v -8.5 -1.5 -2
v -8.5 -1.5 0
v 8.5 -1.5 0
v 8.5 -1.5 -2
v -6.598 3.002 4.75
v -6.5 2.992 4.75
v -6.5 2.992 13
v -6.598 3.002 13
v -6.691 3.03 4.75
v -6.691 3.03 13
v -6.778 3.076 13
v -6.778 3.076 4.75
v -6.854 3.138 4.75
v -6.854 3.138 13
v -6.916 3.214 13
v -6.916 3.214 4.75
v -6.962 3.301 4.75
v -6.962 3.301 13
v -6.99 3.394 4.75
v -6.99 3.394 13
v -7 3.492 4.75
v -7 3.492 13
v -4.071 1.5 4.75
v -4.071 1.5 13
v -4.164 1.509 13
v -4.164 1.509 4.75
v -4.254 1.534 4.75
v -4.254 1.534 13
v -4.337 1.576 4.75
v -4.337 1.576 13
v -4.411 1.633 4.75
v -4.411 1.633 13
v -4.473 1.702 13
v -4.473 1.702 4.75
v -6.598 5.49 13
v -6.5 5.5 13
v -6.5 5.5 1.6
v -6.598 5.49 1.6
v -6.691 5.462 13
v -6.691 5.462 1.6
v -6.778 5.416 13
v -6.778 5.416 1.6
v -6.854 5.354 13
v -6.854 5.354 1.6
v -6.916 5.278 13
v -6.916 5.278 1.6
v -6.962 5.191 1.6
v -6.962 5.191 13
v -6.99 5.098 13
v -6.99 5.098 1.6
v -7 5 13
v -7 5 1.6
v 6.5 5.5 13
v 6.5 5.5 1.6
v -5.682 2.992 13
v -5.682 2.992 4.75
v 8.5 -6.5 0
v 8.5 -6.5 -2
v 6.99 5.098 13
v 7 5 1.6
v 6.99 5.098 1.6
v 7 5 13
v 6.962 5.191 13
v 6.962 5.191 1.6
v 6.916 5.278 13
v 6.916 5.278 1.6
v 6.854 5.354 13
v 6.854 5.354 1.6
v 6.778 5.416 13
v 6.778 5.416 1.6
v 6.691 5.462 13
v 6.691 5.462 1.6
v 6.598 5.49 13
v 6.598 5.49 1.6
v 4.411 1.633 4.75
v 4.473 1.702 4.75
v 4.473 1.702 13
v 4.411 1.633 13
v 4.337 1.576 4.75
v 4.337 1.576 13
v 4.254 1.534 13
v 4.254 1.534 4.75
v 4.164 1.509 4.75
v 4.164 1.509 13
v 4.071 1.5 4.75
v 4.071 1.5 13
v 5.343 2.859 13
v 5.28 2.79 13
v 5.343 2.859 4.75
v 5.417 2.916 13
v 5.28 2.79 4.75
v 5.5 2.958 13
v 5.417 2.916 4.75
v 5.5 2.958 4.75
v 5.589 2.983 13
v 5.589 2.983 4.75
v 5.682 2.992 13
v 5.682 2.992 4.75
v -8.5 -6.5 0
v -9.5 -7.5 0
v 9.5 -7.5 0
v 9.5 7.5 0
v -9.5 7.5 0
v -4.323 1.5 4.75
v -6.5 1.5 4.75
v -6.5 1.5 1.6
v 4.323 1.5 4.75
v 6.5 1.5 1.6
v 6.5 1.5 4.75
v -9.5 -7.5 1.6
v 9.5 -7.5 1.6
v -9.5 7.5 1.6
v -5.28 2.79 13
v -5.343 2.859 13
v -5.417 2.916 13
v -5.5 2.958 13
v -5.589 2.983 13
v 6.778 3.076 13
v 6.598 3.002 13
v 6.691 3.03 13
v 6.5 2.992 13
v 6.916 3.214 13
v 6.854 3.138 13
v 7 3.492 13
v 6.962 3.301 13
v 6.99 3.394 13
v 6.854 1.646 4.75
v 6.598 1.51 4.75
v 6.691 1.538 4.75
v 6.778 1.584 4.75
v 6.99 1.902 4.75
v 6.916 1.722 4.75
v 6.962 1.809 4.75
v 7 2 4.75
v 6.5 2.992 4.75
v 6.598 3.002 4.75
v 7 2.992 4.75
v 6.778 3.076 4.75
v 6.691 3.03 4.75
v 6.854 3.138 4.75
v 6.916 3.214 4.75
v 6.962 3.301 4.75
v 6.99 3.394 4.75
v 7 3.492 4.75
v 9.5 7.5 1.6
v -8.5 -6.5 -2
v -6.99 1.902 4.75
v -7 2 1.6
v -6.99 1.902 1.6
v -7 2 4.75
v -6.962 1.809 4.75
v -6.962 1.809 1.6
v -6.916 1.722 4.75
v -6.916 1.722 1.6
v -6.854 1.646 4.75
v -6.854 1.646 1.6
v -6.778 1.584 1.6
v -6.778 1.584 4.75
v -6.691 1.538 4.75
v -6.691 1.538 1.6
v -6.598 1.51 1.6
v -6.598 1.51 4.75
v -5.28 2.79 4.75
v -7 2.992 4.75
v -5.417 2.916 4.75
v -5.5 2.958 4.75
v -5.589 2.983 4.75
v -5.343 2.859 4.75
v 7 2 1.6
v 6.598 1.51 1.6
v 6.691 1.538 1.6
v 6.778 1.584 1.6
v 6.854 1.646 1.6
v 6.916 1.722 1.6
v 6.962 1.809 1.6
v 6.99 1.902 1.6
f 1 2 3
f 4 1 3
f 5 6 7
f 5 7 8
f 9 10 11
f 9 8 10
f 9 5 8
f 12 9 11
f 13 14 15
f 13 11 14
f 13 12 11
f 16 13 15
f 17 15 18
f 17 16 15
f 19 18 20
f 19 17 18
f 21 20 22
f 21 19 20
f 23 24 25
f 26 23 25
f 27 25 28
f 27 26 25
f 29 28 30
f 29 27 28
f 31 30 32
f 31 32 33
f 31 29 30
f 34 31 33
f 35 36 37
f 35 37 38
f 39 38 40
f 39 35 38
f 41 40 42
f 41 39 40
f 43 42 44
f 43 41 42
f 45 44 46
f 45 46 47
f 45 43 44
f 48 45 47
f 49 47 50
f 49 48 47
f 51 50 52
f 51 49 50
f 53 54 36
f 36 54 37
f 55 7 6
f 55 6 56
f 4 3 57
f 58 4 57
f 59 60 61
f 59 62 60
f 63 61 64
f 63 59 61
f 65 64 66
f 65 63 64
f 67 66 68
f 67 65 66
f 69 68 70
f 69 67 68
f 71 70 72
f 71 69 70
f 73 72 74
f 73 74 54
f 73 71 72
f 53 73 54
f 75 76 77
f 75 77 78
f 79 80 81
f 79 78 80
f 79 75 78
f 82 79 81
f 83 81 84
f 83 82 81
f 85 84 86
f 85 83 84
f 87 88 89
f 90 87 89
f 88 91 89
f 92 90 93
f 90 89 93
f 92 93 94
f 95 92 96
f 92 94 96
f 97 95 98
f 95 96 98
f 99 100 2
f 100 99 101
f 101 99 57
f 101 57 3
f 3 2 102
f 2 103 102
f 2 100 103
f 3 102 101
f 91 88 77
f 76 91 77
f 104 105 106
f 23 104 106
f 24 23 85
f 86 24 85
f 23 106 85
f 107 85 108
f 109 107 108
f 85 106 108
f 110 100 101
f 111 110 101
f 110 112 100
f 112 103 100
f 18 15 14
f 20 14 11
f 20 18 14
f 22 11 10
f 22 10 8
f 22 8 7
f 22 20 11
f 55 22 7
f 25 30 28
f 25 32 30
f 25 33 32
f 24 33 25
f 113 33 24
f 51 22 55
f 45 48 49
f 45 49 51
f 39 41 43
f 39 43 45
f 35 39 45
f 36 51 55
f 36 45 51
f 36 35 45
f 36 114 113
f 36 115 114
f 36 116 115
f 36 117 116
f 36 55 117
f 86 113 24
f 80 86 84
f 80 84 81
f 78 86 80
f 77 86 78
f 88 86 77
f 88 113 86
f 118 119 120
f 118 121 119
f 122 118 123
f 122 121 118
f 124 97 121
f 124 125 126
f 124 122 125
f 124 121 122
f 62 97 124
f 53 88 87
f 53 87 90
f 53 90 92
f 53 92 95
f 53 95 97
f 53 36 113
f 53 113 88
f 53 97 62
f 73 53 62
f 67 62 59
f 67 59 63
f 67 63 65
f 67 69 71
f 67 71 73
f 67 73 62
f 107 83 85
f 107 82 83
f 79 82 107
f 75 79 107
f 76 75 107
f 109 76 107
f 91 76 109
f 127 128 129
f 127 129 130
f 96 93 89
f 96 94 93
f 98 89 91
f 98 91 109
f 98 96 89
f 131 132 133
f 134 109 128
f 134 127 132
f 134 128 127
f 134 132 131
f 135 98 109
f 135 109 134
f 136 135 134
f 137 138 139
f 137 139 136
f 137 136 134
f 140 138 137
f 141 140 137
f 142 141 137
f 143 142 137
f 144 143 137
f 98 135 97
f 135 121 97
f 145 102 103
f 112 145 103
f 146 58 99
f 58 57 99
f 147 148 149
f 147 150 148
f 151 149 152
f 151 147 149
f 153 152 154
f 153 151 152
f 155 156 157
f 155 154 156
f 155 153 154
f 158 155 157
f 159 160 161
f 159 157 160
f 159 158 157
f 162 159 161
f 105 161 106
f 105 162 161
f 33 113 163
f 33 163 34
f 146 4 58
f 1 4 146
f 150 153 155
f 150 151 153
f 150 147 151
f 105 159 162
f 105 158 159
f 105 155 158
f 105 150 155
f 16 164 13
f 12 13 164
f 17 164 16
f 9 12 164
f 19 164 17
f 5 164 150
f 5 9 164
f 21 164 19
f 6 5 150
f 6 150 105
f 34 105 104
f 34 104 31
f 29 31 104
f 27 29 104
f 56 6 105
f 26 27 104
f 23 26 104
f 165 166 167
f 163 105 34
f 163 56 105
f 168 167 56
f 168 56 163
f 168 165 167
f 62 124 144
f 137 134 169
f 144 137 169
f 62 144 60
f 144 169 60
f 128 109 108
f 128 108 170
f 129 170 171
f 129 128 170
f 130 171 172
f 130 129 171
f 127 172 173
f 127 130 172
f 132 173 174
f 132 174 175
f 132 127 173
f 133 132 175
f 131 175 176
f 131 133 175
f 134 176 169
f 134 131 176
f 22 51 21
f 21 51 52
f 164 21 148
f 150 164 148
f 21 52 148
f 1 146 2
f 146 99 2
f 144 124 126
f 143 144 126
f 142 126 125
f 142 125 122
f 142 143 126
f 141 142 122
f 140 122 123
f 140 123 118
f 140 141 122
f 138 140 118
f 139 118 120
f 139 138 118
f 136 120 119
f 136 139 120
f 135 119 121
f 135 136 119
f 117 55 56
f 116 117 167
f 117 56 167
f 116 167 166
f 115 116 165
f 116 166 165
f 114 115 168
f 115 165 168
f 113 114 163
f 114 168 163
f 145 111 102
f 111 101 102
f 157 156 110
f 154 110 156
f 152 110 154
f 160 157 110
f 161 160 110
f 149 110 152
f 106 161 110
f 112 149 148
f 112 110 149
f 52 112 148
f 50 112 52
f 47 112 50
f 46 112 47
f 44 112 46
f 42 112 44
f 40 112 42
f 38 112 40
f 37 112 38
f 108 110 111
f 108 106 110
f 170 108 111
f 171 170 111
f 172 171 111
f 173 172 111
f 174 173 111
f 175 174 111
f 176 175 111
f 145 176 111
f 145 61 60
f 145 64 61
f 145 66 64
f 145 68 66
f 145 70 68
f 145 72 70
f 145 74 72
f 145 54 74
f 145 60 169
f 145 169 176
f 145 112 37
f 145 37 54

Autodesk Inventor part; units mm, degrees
ref_plane "YZ Plane" through (0, 0, 0) normal (1, 0, 0) x (0, 1, 0)
ref_plane "XZ Plane" through (0, 0, 0) normal (0, 1, 0) x (-1, 0, 0)
sketch "Sketch1" plane through (0, 0, 0) normal (0, 0, 1) x (1, 0, 0)
  line L0 (-9.5, -7.5) -> (9.5, -7.5)
  line L1 (9.5, -7.5) -> (9.5, 7.5)
  line L2 (9.5, 7.5) -> (-9.5, 7.5)
  line L3 (-9.5, 7.5) -> (-9.5, -7.5)
  line L4 (-9.5, -7.5) -> (9.5, 7.5) construction
  line L5 (9.5, -7.5) -> (-9.5, 7.5) construction
  point P0 (0, 0)
  dimension "d0" = 19
  dimension "d1" = 15
extrude "Extrusion1" add sketch "Sketch1" along normal blind 1.6
sketch "Sketch2" plane through (0, 0, 0) normal (0, 0, -1) x (-1, 0, 0)
  line L0 (0, -10.5) -> (0, 10.5) projected
  line L1 (-8.5, -6.5) -> (8.5, -6.5)
  line L2 (8.5, -6.5) -> (8.5, -1.5)
  line L3 (8.5, -1.5) -> (-8.5, -1.5)
  line L4 (-8.5, -1.5) -> (-8.5, -6.5)
  line L5 (-8.5, -6.5) -> (8.5, -1.5) construction
  line L6 (8.5, -6.5) -> (-8.5, -1.5) construction
  line L7 (9.5, -7.5) -> (-9.5, -7.5) projected
  point P0 (0, 0)
  point P1 (0, -4)
  dimension "d4" = 5
  dimension "d5" = 1
  dimension "d6" = 17
extrude "Extrusion2" add sketch "Sketch2" along normal blind 2
sketch "Sketch3" plane through (0, 0, 1.6) normal (0, 0, 1) x (1, 0, 0)
  line L0 (0, -10.5) -> (0, 10.5) projected
  line L1 (-7, 1.5) -> (7, 1.5)
  line L2 (7, 1.5) -> (7, 5.5)
  line L3 (7, 5.5) -> (-7, 5.5)
  line L4 (-7, 5.5) -> (-7, 1.5)
  line L5 (-7, 1.5) -> (7, 5.5) construction
  line L6 (7, 1.5) -> (-7, 5.5) construction
  line L7 (9.5, 7.5) -> (-9.5, 7.5) projected
  point P0 (0, 0)
  point P1 (0, 3.5)
  dimension "d9" = 14
  dimension "d10" = 4
  dimension "d11" = 2
ref_plane "Work Plane1" through (0, 0, 13) normal (0, 0, -1) x (-1, 0, 0)
extrude "Extrusion3" add sketch "Sketch3" along normal up to surface (11.4 mm away)
sketch "Sketch4" plane through (-7, 1.5, 13) normal (0, 0, 1) x (1, 0, 0)
  line L0 (0, 4) -> (0, 0) projected
  line L1 (0, 0) -> (14, 0) projected
  line L2 (14, 0) -> (14, 4) projected
  line L3 (14, 4) -> (0, 4) projected
  line L4 (0, 1.492) -> (1.5696, 1.492)
  line L5 (1.5696, 1.492) -> (2.677, 0)
  line L6 (7, -12) -> (7, 9) construction
  line L7 (14, 1.492) -> (12.4304, 1.492)
  line L8 (12.4304, 1.492) -> (11.323, 0)
  point P0 (7, -1.5)
extrude "Extrusion4" cut sketch "Sketch4" against normal blind 8.25 contours L4 L5 L1 L0 | L2 L1 L8 L7
fillet "Fillet1" radius 0.5 10 edges at (7, 5.5, 7.3) (-7, 5.5, 7.3) (7, 2.992, 8.875) (4.323, 1.5, 8.875) (-7, 2.992, 8.875) (-4.323, 1.5, 8.875) (-5.4304, 2.992, 8.875) (5.4304, 2.992, 8.875) (7, 1.5, 3.175) (-7, 1.5, 3.175)
properties part number "Adafruit_L_Bend_HDMI_Plug_Adapter_3550"
